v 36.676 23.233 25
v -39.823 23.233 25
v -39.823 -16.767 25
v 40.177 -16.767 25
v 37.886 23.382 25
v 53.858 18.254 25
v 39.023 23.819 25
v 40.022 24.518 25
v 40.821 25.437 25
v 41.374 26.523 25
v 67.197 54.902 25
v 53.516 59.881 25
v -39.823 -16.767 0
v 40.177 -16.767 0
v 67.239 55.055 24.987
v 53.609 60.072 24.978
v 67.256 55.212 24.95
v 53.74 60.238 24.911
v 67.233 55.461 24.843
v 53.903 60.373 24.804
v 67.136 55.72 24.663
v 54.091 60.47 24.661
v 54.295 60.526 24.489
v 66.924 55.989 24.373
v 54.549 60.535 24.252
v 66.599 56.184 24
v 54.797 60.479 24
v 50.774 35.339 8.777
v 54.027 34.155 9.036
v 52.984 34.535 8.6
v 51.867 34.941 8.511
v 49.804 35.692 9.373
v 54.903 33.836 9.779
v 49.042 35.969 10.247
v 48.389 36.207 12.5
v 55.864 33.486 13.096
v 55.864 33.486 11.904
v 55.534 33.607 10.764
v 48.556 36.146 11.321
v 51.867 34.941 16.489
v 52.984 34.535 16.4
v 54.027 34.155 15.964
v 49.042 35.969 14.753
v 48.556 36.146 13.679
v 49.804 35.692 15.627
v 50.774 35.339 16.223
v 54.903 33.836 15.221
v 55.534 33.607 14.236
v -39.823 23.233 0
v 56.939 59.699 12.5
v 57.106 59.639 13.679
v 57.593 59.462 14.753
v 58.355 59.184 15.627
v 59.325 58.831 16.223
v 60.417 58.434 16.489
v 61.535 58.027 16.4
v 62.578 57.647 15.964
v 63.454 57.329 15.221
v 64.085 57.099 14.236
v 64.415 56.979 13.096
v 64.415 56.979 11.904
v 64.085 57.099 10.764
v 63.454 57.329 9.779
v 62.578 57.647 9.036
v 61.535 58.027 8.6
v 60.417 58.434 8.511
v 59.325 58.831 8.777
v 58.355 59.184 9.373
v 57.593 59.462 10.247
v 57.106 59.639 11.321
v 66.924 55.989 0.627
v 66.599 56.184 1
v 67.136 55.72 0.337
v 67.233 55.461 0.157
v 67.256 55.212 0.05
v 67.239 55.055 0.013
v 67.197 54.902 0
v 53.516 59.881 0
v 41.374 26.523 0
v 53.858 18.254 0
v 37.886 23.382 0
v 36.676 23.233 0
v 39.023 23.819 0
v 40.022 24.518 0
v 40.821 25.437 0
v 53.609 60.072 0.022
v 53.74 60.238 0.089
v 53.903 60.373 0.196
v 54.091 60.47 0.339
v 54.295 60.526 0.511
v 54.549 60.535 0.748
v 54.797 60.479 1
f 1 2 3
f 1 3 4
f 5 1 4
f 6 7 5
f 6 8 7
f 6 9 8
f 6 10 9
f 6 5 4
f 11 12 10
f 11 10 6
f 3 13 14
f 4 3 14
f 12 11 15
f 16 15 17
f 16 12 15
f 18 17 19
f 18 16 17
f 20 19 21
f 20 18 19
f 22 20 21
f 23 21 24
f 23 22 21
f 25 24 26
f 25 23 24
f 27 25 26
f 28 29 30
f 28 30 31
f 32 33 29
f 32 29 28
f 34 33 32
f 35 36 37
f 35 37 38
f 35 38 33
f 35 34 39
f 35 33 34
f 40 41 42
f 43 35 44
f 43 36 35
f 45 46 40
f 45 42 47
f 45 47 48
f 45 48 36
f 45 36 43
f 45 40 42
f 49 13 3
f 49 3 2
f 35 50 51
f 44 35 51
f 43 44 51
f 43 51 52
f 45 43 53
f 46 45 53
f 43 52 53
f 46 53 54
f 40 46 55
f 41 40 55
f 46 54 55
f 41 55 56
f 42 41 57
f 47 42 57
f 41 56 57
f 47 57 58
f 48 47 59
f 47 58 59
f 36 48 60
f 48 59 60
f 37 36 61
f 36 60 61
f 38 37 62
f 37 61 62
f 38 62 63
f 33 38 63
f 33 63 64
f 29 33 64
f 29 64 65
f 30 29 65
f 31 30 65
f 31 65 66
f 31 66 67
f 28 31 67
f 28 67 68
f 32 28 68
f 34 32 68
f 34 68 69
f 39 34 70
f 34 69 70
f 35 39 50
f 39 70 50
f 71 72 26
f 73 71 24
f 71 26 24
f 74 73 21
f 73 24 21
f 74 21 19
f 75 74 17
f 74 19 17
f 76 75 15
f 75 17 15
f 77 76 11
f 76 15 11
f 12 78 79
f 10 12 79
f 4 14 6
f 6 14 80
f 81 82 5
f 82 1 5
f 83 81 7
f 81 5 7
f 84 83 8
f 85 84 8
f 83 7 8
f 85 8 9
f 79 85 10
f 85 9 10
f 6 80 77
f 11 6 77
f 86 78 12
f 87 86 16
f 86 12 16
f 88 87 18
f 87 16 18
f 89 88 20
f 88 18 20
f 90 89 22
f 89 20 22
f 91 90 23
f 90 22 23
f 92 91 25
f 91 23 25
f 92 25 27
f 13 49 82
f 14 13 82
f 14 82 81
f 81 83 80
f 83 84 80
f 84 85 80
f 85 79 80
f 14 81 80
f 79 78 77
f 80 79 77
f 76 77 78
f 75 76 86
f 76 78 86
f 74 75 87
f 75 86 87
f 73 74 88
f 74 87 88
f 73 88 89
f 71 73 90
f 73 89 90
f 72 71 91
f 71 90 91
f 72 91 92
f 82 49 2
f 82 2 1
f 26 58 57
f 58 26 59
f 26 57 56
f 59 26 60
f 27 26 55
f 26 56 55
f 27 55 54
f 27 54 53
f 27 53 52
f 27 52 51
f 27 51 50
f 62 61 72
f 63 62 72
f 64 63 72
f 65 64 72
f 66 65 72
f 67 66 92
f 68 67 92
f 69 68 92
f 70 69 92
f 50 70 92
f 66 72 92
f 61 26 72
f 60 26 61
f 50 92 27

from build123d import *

# Parameters (mm, degrees)
F0_W     = 80
F0_H     = 40
F1_DEPTH = 25
F2_R     = 4
F3_DEPTH = 25
F4_R     = 5
F5_R     = 1


with BuildPart() as f1:
    # F0 (on Top) → F1 (new body)
    with BuildSketch(Plane.XY):
        with Locations((0.1769823041, 3.2334145788)):
            Rectangle(F0_W, F0_H)
        Polygon((40.1769823041, 23.2334145788), (40.1769823041, -16.7665854212), (53.8577880371, 18.2540085112), align=None)
        Polygon((53.8577880371, 60.8211194103), (40.1769823041, 23.2334145788), (53.8577880371, 18.2540085112), (67.5385937702, 55.8417133427), align=None)
    extrude(amount=F1_DEPTH)

    # F2 (on face) → F3 (cut)
    with BuildSketch(Plane(origin=(25.8476953784, 71.0159593971, 0), x_dir=(-0.9396926208, 0.3420201433, 0), z_dir=(0.3420201433, 0.9396926208, 0))):
        with Locations((-37.0871226977, 12.5)):
            Circle(F2_R)
    extrude(amount=-F3_DEPTH, mode=Mode.SUBTRACT)

    # F4
    f4_edges = [f1.edges().sort_by_distance(p)[0] for p in [
        (40.176982, 23.233415, 12.5),
    ]]
    fillet(f4_edges, radius=F4_R)

    # F5
    f5_edges = [f1.edges().sort_by_distance(p)[0] for p in [
        (67.538594, 55.841713, 12.5),
        (60.698191, 58.331416, 0),
        (53.857788, 60.821119, 12.5),
        (60.698191, 58.331416, 25),
    ]]
    fillet(f5_edges, radius=F5_R)


solid = f1.part
